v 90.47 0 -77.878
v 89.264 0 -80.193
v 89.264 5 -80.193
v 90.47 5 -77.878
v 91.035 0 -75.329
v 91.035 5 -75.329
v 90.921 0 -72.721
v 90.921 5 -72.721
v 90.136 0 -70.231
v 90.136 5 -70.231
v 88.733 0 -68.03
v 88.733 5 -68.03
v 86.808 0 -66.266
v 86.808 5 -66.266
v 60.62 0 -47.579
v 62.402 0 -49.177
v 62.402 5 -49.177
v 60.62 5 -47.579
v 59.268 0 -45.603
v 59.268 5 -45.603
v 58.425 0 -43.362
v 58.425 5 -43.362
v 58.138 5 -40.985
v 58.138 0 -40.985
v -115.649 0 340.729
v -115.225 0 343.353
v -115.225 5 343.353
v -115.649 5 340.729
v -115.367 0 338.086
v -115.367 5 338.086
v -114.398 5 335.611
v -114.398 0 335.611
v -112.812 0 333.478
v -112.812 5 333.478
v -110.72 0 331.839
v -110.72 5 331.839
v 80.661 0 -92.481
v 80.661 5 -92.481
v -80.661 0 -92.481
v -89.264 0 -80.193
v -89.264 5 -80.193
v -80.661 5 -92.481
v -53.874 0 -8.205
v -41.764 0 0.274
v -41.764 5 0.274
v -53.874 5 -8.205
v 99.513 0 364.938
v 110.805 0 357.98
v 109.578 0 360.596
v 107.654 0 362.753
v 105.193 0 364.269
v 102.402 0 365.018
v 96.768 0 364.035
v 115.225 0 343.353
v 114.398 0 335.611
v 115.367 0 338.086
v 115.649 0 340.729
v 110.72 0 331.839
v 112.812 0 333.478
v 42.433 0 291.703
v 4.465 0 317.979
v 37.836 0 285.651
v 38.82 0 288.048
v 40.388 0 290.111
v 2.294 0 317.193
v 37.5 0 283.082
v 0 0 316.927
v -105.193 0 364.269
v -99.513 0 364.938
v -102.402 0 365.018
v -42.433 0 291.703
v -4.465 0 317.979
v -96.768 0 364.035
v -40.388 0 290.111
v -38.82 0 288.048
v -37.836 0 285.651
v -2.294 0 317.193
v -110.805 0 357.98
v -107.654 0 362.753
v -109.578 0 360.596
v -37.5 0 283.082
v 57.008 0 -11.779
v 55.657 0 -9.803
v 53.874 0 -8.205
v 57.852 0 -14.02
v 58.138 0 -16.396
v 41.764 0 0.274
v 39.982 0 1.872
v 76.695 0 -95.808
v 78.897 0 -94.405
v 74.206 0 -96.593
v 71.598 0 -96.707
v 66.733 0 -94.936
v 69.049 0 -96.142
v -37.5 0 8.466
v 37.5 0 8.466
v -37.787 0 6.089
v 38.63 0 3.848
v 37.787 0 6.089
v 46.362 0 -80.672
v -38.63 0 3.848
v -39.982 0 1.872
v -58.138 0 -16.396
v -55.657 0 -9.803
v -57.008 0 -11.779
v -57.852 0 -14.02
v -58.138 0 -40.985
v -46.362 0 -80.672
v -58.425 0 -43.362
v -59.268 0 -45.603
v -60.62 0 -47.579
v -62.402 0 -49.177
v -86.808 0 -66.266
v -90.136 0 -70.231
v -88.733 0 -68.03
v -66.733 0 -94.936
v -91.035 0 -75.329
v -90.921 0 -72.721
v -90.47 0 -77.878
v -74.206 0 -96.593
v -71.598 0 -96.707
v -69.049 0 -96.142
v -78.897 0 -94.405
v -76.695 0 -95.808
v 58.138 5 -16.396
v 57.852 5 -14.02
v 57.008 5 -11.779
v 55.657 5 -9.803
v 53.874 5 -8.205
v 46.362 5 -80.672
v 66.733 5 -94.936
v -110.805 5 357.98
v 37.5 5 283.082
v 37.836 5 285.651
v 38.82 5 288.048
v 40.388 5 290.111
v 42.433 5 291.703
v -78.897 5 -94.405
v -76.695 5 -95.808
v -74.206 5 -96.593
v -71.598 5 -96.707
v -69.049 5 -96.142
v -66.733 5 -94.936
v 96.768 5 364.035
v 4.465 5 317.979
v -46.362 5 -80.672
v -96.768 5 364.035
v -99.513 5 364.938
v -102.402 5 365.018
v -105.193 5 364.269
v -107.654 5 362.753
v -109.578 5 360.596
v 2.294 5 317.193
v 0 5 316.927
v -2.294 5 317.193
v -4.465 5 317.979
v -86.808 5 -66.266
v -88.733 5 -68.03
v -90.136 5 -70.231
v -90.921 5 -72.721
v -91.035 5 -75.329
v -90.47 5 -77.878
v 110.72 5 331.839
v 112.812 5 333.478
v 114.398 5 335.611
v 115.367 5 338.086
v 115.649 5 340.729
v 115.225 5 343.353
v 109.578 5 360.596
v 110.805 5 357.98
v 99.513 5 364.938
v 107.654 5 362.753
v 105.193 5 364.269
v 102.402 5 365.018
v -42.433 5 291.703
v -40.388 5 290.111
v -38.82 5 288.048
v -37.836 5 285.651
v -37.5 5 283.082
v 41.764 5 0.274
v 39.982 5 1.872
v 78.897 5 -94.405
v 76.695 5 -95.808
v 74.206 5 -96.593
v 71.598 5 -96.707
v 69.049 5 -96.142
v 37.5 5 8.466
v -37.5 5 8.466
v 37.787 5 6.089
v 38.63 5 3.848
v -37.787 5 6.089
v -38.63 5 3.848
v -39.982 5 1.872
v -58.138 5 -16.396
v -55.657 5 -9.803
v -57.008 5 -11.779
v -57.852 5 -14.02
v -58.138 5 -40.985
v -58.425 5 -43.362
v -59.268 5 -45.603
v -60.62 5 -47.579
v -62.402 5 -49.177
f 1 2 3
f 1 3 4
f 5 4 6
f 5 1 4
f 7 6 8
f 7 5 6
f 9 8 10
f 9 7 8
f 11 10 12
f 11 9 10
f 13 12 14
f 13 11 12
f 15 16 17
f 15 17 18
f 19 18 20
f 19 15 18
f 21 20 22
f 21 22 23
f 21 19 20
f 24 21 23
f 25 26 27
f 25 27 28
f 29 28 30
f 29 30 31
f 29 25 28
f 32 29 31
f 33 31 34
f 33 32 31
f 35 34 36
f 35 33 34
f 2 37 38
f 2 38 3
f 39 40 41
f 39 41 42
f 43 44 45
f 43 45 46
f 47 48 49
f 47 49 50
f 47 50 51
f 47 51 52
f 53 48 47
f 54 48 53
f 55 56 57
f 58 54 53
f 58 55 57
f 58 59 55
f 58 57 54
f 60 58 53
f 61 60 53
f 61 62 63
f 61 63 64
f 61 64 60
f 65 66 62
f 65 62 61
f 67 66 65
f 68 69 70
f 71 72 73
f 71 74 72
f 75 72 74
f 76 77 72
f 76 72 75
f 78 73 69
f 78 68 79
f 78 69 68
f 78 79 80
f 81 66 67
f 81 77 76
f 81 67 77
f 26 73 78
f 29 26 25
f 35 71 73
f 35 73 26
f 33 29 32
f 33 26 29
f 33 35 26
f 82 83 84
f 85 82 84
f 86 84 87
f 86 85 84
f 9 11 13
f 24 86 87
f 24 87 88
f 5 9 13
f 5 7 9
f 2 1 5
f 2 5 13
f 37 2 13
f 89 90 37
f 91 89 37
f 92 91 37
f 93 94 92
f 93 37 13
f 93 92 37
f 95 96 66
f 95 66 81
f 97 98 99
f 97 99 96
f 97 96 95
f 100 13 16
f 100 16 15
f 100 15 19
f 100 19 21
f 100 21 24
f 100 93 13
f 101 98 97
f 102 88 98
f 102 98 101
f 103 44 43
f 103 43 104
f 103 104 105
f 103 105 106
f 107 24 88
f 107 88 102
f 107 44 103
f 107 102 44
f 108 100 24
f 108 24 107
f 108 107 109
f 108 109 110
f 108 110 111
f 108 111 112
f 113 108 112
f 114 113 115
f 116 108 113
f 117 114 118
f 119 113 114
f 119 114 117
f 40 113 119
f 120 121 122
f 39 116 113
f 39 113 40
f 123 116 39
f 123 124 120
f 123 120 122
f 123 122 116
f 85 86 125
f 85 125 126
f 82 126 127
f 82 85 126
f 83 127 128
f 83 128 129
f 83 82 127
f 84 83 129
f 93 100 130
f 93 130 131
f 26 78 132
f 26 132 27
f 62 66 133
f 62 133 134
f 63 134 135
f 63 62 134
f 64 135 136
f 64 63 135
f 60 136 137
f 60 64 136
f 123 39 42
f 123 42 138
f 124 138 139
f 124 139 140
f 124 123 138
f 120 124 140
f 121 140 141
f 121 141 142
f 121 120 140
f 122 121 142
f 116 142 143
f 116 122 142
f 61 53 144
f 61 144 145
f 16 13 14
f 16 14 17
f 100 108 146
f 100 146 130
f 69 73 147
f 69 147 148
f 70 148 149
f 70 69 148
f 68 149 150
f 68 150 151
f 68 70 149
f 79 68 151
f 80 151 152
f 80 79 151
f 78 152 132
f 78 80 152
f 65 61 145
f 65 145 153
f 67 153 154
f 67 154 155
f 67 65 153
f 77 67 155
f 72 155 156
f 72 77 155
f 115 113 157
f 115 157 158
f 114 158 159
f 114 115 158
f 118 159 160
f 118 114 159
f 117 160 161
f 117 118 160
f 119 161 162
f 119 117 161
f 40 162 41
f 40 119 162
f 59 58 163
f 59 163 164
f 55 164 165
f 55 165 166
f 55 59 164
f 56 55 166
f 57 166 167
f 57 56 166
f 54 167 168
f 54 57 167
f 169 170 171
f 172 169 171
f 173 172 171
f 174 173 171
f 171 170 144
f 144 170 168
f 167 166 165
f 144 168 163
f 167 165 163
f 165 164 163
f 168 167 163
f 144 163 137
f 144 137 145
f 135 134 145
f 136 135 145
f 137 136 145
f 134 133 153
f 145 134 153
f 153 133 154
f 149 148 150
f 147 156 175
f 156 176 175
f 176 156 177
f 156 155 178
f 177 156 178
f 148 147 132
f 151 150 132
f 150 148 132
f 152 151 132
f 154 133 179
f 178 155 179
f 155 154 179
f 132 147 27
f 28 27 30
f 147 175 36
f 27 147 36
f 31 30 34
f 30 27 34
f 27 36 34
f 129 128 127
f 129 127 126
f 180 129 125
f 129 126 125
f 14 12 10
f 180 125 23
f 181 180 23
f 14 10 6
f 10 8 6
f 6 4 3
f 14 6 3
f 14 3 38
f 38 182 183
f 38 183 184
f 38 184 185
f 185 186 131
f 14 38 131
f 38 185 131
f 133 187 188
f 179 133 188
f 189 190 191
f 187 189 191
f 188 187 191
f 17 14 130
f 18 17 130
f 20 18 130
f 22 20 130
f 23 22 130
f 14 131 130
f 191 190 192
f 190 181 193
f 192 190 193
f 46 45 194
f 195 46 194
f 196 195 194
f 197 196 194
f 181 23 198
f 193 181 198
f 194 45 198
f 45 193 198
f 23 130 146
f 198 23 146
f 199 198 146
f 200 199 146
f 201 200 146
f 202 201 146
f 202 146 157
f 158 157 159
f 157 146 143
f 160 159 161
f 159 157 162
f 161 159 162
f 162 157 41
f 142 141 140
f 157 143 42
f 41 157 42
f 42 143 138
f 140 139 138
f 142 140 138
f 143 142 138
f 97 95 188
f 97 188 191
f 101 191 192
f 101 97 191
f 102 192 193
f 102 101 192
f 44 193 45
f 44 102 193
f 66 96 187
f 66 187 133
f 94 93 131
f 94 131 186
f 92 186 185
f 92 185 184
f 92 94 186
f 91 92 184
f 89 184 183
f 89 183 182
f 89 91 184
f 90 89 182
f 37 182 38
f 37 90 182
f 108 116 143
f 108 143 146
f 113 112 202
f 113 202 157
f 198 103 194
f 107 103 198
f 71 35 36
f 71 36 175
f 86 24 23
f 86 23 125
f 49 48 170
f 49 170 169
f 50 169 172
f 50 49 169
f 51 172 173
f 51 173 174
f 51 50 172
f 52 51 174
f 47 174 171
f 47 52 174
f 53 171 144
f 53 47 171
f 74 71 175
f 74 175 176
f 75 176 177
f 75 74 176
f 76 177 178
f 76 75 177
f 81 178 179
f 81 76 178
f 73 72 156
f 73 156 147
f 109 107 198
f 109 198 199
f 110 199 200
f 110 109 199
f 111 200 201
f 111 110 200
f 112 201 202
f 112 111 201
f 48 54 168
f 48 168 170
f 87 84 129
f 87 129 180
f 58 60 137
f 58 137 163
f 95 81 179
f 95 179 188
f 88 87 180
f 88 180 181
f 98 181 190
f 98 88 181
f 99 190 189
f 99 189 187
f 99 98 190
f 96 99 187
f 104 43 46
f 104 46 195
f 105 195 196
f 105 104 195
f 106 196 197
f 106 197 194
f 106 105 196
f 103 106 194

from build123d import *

# Parameters (mm, degrees)
BOSS_EXTRUDE1_DEPTH = 5


with BuildPart() as part:
    # Sketch2 → Boss-Extrude1 (new body)
    with BuildSketch(Plane(origin=(0, 0, 0), x_dir=(1, 0, 0), z_dir=(0, 1, 0))):
        with BuildLine():
            Line((-46.361864593, 80.672065662), (46.361864593, 80.672065662))
            Line((46.361864593, 80.672065662), (66.733304285, 94.936301299))
            ThreePointArc((66.733304285, 94.936301299), (74.205550425, 96.592858386), (80.660589091, 92.480545219))
            Line((80.660589091, 92.480545219), (89.264235636, 80.193264555))
            ThreePointArc((89.264235636, 80.193264555), (90.920792724, 72.721018415), (86.808479557, 66.265979749))
            Line((86.808479557, 66.265979749), (62.402393643, 49.176654414))
            ThreePointArc((62.402393643, 49.176654414), (59.268049675, 45.602620103), (58.138158007, 40.985133971))
            Line((58.138158007, 40.985133971), (58.138158007, 16.396474982))
            ThreePointArc((58.138158007, 16.396474982), (57.008266339, 11.77898885), (53.873922371, 8.204954539))
            Line((53.873922371, 8.204954539), (41.764235636, -0.274339397))
            ThreePointArc((41.764235636, -0.274339397), (38.629891668, -3.848373708), (37.5, -8.46585984))
            Line((37.5, -8.46585984), (37.5, -283.0815533))
            ThreePointArc((37.5, -283.0815533), (38.82037806, -288.047856048), (42.432832597, -291.702679358))
            Line((42.432832597, -291.702679358), (110.719624802, -331.839038015))
            ThreePointArc((110.719624802, -331.839038015), (114.964915466, -336.816247945), (115.224929316, -343.352875846))
            Line((115.224929316, -343.352875846), (110.804845639, -357.979679412))
            ThreePointArc((110.804845639, -357.979679412), (105.193270142, -364.269086107), (96.767619692, -364.034926706))
            Line((96.767619692, -364.034926706), (4.46475403, -317.978659754))
            ThreePointArc((4.46475403, -317.978659754), (0, -316.92661882), (-4.46475403, -317.978659754))
            Line((-4.46475403, -317.978659754), (-96.767619692, -364.034926706))
            ThreePointArc((-96.767619692, -364.034926706), (-105.193270142, -364.269086107), (-110.804845639, -357.979679412))
            Line((-110.804845639, -357.979679412), (-115.224929316, -343.352875846))
            ThreePointArc((-115.224929316, -343.352875846), (-114.964915466, -336.816247945), (-110.719624802, -331.839038015))
            Line((-110.719624802, -331.839038015), (-42.432832597, -291.702679358))
            ThreePointArc((-42.432832597, -291.702679358), (-38.82037806, -288.047856048), (-37.5, -283.0815533))
            Line((-37.5, -283.0815533), (-37.5, -8.46585984))
            ThreePointArc((-37.5, -8.46585984), (-38.629891668, -3.848373708), (-41.764235636, -0.274339397))
            Line((-41.764235636, -0.274339397), (-53.873922371, 8.204954539))
            ThreePointArc((-53.873922371, 8.204954539), (-57.008266339, 11.77898885), (-58.138158007, 16.396474982))
            Line((-58.138158007, 16.396474982), (-58.138158007, 40.985133971))
            ThreePointArc((-58.138158007, 40.985133971), (-59.268049675, 45.602620103), (-62.402393643, 49.176654414))
            Line((-62.402393643, 49.176654414), (-86.808479557, 66.265979749))
            ThreePointArc((-86.808479557, 66.265979749), (-90.920792724, 72.721018415), (-89.264235636, 80.193264555))
            Line((-89.264235636, 80.193264555), (-80.660589091, 92.480545219))
            ThreePointArc((-80.660589091, 92.480545219), (-74.205550425, 96.592858386), (-66.733304285, 94.936301299))
            Line((-66.733304285, 94.936301299), (-46.361864593, 80.672065662))
        make_face()
    extrude(amount=BOSS_EXTRUDE1_DEPTH)


solid = part.part
